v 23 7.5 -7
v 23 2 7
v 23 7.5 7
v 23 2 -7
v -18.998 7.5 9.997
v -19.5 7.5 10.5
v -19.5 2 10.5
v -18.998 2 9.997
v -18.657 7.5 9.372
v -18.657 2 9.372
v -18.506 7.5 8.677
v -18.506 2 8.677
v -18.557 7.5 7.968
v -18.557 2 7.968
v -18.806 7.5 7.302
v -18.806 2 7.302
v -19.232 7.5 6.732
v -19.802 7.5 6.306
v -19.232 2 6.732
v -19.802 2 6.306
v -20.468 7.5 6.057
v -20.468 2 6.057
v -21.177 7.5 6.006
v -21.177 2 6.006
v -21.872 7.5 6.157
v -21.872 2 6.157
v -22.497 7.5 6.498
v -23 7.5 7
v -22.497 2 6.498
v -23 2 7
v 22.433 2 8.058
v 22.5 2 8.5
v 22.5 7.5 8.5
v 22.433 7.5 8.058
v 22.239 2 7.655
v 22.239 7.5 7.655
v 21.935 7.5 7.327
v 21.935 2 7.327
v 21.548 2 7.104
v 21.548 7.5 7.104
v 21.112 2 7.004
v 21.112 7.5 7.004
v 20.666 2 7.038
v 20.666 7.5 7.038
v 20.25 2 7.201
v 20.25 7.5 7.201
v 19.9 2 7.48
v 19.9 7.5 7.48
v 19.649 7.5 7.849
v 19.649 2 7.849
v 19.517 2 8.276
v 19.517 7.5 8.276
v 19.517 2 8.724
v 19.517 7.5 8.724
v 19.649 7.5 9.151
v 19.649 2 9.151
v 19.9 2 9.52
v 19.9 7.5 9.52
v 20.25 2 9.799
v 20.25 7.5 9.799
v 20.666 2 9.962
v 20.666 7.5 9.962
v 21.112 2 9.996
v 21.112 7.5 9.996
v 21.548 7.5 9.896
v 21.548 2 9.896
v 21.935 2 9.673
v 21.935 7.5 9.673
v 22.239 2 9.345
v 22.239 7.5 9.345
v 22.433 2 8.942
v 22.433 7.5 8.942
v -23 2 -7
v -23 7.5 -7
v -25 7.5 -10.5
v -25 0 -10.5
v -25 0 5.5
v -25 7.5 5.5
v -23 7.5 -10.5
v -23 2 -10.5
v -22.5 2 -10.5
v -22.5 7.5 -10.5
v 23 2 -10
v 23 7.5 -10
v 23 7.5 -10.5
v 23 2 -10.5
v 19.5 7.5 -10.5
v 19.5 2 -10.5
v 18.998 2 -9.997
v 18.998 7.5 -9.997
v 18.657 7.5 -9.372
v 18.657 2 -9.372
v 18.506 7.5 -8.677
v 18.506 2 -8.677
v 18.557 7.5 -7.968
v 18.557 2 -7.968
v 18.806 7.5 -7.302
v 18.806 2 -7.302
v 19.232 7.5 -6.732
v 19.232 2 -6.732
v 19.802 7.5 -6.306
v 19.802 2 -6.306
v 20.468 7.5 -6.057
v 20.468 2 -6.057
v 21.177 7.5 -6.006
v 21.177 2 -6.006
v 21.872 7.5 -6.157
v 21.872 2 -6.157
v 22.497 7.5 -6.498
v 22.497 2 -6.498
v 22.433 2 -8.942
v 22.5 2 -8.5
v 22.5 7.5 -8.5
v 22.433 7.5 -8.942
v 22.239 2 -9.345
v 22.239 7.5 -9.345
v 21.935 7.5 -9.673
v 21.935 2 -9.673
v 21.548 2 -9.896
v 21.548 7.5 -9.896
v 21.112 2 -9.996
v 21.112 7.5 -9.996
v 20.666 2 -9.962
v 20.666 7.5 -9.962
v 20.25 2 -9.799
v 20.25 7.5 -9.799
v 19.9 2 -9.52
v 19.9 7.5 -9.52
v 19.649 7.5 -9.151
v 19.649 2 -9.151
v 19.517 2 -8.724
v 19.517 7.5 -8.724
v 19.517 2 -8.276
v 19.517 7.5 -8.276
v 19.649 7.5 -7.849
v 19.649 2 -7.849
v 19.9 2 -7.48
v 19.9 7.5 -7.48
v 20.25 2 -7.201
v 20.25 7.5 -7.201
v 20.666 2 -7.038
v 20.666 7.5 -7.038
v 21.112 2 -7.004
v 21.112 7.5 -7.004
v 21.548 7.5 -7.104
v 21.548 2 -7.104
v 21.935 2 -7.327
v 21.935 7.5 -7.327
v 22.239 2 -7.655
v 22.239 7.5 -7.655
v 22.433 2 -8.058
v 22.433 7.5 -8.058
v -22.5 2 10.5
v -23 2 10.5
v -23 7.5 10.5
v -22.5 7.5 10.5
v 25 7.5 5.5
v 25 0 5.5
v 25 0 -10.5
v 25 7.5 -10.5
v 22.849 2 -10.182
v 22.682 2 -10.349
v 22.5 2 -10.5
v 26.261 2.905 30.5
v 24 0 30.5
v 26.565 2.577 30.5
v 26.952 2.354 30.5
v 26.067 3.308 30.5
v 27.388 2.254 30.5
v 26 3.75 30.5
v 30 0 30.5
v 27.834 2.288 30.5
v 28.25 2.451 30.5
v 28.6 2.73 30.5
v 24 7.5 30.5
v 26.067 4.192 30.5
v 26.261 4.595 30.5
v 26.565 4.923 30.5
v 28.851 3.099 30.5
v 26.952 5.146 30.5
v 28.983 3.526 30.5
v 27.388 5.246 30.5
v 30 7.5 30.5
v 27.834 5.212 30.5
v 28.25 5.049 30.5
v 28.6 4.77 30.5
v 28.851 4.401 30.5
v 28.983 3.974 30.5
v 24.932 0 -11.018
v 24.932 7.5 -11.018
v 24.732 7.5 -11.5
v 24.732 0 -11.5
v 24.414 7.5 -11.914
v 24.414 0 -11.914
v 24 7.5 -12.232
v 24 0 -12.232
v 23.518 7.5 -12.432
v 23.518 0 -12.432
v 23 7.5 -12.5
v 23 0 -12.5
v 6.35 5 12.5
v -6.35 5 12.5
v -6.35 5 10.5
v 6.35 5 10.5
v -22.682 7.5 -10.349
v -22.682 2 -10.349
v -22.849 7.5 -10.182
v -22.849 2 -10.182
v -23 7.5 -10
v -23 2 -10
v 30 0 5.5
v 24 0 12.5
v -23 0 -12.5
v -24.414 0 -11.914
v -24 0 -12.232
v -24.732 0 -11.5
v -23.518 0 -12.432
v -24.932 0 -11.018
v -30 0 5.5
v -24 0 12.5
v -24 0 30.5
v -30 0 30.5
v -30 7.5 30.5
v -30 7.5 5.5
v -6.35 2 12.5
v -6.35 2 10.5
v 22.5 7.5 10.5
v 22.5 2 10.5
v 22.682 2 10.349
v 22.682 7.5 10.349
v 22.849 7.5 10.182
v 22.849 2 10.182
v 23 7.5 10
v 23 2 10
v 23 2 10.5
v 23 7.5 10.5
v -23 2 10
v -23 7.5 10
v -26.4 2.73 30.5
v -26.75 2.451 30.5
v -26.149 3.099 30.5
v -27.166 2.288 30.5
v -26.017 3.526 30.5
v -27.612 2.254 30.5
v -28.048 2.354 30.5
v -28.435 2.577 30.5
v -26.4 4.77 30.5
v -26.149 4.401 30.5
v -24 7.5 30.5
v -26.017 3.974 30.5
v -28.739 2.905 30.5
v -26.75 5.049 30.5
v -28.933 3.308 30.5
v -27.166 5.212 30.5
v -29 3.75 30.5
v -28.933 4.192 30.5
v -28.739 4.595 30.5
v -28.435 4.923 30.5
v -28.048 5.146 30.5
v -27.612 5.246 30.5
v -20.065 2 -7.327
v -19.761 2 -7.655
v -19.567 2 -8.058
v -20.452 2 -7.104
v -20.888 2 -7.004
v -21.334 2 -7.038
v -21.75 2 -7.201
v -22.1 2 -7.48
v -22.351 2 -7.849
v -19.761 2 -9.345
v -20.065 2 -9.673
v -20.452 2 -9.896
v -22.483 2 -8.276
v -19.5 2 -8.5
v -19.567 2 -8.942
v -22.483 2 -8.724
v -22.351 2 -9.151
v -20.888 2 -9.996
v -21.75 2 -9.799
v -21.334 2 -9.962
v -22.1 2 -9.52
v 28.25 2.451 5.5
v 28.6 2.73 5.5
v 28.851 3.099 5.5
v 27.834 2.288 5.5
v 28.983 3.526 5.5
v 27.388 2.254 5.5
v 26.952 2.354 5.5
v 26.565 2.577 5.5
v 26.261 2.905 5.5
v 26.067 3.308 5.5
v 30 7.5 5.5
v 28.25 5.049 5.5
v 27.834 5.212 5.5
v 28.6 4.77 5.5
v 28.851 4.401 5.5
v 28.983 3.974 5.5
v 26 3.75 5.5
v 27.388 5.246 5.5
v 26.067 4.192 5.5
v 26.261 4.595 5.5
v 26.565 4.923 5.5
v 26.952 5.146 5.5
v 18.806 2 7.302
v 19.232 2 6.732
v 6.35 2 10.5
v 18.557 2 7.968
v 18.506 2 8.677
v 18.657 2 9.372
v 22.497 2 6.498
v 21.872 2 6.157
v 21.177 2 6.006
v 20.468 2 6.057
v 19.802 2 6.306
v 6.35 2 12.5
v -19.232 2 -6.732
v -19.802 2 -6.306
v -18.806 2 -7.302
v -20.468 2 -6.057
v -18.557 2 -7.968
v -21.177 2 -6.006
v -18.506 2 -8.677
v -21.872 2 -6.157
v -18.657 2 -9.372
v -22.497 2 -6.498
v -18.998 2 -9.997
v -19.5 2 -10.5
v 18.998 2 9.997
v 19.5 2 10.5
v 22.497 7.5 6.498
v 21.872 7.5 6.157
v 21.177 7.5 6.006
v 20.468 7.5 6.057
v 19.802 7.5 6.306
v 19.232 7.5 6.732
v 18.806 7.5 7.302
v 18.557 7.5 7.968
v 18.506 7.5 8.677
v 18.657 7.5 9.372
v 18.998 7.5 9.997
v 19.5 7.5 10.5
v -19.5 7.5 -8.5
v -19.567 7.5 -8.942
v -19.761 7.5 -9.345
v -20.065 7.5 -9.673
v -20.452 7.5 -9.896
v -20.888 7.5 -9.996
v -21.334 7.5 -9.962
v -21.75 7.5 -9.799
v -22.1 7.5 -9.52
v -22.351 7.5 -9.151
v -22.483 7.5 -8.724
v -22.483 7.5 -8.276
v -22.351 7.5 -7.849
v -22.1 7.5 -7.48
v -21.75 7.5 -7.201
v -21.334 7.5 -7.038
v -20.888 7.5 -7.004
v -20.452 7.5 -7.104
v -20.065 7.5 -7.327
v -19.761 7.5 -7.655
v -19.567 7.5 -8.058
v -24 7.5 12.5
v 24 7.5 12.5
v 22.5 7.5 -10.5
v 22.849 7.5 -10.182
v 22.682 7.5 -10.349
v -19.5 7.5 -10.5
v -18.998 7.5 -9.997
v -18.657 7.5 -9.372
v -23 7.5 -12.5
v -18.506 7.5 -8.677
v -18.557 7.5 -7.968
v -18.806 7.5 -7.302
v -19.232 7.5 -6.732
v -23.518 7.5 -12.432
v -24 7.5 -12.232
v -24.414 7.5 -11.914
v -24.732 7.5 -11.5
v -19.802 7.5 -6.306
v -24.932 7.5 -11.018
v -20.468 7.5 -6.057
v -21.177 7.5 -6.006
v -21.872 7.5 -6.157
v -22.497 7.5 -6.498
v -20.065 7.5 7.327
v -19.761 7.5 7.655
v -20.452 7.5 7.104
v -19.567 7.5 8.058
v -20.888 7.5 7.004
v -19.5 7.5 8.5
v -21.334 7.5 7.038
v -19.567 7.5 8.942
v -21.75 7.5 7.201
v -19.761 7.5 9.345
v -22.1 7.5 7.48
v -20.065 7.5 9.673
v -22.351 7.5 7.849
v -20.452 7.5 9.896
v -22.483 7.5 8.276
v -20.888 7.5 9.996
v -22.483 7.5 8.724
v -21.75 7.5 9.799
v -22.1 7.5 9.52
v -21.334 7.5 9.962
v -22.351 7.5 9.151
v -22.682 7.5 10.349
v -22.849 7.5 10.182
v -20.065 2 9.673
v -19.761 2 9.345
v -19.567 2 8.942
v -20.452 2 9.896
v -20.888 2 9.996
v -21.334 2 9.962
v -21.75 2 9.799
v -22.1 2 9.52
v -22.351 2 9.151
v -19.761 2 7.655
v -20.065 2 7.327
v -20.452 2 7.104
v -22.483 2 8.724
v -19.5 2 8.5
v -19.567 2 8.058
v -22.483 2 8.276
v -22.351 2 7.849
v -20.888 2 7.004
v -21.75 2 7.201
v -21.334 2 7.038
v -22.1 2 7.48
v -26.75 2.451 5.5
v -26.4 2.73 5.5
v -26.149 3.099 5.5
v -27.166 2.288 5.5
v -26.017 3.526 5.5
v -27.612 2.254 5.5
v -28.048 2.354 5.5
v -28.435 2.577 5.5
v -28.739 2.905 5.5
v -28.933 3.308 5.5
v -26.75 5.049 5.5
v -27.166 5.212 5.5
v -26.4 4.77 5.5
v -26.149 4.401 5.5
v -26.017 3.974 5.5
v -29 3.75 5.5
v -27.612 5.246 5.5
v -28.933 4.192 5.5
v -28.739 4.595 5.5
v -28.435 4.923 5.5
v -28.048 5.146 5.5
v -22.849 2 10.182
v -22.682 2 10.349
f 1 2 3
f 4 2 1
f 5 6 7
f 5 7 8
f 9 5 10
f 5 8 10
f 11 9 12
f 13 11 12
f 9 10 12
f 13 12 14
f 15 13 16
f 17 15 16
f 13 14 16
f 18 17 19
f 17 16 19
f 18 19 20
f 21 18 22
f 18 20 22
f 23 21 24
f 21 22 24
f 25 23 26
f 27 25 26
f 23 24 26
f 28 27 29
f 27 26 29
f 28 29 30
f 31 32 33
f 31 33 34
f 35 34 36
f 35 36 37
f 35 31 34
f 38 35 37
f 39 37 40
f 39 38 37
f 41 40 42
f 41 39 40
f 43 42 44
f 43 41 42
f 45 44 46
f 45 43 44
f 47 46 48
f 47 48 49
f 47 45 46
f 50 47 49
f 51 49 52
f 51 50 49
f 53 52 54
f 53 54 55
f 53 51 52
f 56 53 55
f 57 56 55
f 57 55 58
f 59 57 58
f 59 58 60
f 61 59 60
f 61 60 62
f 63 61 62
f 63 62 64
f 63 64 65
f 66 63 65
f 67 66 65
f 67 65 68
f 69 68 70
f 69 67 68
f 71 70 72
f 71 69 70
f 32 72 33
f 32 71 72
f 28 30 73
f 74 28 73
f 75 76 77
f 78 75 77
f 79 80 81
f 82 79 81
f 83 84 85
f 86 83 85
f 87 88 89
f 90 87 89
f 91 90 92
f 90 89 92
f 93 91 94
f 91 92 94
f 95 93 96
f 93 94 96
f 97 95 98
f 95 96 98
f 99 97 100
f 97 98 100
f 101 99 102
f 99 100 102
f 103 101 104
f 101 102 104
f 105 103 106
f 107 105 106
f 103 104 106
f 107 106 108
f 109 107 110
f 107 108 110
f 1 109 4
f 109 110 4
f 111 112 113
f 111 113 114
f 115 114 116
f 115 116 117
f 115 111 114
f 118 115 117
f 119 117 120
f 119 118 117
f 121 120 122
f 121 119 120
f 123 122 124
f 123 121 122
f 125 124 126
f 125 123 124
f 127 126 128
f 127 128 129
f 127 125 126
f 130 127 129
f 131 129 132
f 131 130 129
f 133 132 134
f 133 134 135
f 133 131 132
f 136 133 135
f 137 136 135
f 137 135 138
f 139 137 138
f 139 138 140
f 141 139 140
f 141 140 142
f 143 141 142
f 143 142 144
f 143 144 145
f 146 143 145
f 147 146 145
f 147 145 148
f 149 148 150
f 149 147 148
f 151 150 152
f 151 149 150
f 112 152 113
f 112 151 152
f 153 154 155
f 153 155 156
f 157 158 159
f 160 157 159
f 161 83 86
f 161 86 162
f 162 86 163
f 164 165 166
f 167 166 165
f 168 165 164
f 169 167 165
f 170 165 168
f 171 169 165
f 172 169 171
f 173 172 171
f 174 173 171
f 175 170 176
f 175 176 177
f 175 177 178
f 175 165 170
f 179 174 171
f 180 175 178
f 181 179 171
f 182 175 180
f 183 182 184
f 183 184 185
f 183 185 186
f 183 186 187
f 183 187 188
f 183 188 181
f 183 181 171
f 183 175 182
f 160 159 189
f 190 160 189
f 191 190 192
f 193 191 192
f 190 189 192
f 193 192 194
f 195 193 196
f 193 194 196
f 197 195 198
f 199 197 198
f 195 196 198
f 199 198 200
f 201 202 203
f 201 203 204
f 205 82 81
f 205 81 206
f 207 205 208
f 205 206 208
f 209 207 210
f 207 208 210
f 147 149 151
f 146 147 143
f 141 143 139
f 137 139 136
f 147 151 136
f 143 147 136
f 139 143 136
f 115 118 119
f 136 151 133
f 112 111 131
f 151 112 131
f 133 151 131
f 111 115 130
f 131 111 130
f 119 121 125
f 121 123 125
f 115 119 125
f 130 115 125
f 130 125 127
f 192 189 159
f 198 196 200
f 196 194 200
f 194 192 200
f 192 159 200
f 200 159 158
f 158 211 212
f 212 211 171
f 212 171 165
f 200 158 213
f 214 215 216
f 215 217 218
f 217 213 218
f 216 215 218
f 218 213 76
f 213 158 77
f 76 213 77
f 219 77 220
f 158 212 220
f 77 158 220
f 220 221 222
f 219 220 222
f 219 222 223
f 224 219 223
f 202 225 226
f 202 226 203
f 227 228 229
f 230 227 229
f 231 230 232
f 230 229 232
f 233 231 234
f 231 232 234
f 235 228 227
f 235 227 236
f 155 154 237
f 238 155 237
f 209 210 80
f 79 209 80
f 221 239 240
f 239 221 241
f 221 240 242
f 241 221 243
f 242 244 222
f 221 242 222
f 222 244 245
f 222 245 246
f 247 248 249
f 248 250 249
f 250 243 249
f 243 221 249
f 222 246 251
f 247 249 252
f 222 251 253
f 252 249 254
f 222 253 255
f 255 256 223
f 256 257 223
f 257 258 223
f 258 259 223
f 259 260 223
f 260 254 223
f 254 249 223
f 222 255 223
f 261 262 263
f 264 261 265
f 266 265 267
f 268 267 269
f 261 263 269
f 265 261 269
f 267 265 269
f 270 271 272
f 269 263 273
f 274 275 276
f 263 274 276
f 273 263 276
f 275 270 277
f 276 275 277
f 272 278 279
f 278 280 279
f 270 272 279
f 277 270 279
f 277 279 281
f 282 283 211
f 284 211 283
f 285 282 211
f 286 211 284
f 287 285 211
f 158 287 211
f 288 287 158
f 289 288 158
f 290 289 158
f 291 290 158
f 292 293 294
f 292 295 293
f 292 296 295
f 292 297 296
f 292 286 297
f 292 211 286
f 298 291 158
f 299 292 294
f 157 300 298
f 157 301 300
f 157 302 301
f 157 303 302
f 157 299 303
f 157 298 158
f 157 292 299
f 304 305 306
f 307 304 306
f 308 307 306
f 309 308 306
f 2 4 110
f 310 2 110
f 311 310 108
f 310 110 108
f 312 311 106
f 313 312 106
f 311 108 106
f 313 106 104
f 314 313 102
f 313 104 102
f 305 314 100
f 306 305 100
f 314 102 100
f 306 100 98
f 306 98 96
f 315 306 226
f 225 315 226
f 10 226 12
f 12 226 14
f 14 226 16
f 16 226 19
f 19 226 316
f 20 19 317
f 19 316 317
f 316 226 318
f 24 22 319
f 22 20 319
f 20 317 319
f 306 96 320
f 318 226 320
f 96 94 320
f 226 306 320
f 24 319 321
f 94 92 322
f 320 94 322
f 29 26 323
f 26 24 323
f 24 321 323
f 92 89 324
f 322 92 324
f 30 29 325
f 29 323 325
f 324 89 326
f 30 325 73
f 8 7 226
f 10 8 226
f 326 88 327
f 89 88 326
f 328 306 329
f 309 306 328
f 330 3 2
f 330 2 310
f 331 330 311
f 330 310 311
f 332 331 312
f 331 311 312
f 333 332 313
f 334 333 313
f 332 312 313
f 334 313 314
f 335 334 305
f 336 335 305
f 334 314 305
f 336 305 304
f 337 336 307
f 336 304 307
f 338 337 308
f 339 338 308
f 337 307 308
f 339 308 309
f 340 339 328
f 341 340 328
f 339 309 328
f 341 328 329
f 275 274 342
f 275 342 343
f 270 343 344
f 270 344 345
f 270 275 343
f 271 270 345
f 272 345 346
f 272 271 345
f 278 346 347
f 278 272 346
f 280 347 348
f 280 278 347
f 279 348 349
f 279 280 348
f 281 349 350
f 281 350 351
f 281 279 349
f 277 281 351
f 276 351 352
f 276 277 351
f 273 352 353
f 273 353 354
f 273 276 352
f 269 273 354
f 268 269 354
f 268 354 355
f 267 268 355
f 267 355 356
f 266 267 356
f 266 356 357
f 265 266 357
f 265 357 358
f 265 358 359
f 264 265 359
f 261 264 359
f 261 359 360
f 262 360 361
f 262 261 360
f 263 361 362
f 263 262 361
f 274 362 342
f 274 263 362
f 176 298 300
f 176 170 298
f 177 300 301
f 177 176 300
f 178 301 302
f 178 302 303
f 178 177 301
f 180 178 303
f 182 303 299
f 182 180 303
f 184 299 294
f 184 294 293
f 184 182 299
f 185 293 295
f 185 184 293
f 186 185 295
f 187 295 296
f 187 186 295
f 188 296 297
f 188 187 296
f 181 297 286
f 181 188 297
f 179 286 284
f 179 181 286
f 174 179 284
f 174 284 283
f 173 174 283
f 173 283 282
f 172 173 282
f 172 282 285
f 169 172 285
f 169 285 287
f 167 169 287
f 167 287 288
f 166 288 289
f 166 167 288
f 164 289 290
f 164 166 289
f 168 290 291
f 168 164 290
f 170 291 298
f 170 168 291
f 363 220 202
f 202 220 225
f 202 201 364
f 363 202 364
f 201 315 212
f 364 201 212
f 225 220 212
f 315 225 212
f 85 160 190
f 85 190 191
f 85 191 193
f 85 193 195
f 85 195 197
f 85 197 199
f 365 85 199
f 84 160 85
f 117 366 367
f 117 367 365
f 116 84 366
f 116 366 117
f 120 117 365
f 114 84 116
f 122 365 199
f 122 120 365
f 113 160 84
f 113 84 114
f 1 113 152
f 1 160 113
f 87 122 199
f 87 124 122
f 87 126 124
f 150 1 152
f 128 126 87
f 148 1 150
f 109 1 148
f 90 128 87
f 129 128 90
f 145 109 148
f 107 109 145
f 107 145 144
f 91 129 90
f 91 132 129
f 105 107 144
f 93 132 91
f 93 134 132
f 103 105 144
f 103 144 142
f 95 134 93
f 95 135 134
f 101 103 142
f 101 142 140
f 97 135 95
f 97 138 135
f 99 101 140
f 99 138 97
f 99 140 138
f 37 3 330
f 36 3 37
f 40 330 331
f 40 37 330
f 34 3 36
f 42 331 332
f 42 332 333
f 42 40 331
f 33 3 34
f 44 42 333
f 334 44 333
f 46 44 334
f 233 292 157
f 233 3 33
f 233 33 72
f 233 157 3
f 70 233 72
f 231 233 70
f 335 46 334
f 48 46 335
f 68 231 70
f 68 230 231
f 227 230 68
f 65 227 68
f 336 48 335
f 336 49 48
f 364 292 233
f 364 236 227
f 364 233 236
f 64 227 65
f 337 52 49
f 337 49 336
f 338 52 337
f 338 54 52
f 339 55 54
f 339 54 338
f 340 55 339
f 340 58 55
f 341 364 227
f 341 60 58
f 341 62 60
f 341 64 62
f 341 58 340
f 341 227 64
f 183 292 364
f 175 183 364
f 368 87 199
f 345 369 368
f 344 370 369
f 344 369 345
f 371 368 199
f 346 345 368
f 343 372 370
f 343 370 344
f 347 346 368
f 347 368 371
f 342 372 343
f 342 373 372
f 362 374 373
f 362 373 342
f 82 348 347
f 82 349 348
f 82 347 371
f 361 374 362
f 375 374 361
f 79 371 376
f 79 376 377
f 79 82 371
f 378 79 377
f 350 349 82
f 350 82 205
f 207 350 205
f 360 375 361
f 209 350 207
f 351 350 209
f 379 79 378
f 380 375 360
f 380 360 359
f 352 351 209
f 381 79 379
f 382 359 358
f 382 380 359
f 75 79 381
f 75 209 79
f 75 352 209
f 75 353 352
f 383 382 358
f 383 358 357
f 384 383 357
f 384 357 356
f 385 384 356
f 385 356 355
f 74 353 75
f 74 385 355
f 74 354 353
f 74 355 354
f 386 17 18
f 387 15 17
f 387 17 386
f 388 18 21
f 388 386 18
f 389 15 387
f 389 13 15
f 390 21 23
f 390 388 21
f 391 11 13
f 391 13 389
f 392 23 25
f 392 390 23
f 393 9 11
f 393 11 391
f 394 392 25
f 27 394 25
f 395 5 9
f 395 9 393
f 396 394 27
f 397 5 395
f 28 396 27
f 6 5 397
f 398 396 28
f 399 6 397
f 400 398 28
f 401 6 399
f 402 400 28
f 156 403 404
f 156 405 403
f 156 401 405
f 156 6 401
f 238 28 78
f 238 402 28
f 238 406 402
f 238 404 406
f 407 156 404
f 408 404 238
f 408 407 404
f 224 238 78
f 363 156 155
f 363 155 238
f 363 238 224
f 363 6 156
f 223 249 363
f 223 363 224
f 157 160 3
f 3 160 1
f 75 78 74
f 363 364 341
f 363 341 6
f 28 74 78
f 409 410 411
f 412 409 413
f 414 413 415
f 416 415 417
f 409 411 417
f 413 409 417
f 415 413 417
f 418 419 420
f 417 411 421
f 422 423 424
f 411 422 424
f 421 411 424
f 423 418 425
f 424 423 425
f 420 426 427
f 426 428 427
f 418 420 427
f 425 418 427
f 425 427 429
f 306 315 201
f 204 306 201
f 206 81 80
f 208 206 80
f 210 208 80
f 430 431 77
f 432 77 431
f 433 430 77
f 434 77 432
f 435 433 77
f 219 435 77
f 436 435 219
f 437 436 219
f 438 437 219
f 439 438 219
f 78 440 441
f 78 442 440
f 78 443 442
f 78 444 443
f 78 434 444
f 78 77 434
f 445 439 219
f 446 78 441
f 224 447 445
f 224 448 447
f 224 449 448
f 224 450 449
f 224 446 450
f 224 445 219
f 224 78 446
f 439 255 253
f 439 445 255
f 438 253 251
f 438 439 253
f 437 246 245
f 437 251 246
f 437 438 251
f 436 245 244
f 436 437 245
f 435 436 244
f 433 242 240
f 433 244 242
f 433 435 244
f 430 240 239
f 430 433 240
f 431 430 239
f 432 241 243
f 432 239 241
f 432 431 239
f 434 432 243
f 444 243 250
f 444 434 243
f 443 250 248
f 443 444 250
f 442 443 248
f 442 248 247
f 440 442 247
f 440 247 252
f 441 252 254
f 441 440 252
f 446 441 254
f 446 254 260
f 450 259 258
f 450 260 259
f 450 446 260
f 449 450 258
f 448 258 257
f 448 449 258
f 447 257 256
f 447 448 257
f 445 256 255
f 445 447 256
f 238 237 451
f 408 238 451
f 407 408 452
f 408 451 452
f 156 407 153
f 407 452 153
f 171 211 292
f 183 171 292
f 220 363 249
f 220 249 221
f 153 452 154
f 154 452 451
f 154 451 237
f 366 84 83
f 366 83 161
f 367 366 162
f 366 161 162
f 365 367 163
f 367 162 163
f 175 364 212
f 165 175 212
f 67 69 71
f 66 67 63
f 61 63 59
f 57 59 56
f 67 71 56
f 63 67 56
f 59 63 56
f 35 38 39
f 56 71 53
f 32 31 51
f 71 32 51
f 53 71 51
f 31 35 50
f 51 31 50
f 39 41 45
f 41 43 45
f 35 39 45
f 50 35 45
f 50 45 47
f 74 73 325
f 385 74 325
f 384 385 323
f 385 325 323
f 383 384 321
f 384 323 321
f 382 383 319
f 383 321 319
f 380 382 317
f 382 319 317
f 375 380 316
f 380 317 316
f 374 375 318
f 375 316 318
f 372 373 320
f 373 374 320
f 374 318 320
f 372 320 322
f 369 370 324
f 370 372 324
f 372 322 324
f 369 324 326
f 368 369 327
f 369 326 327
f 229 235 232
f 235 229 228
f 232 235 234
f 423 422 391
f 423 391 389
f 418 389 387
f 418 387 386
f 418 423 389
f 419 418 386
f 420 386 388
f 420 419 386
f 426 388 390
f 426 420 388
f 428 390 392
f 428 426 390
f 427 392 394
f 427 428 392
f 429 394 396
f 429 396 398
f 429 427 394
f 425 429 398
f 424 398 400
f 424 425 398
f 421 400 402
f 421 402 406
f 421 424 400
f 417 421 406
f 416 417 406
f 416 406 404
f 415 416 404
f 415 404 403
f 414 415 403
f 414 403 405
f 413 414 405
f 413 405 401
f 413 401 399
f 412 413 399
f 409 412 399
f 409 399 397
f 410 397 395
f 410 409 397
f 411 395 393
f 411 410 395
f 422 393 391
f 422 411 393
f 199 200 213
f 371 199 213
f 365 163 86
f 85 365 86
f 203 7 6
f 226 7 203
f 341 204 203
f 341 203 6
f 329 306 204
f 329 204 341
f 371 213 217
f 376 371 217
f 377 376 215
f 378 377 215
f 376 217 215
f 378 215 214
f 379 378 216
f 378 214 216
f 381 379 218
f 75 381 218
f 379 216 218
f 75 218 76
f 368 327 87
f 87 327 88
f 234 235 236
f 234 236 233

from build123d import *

# Parameters (mm, degrees)
EXTRUDE_1_DEPTH     = 2
SKETCH_2_W          = 46
SKETCH_2_H          = 21
EXTRUDE_2_DEPTH     = 5.5
SKETCH_3_R          = 2.5
SKETCH_3_R_2        = 1.5
EXTRUDE_3_DEPTH     = 5.5
CUT_EXTRUDE_2_REACH = 27
SKETCH_5_W          = 12.7
SKETCH_5_H          = 3
EXTRUDE_4_DEPTH     = 7.5
SKETCH_7_R          = 1.5
CUT_EXTRUDE_3_DEPTH = 3
EXTRUDE_5_DEPTH     = 18
EXTRUDE_6_DEPTH     = 18
SKETCH_10_W         = 5
SKETCH_10_H         = 7.5
SKETCH_10_R         = 1.5
EXTRUDE_7_DEPTH     = 5


with BuildPart() as part:
    # 草图1 → 凸台-拉伸1 (new body)
    with BuildSketch(Plane(origin=(0, 0, 0), x_dir=(1, 0, 0), z_dir=(0, 1, 0))):
        with BuildLine():
            Line((-23, 12.5), (23, 12.5))
            ThreePointArc((23, 12.5), (24.414213562, 11.914213562), (25, 10.5))
            Line((25, 10.5), (25, -10.5))
            ThreePointArc((25, -10.5), (24.414213562, -11.914213562), (23, -12.5))
            Line((23, -12.5), (-23, -12.5))
            ThreePointArc((-23, -12.5), (-24.414213562, -11.914213562), (-25, -10.5))
            Line((-25, -10.5), (-25, 10.5))
            ThreePointArc((-25, 10.5), (-24.414213562, 11.914213562), (-23, 12.5))
        make_face()
    extrude(amount=EXTRUDE_1_DEPTH)

    # 草图2 → 凸台-拉伸2 (add)
    with BuildSketch(Plane(origin=(0, 2, 0), x_dir=(1, 0, 0), z_dir=(0, 1, 0))):
        with BuildLine():
            Line((-25, 10.5), (-25, -10.5))
            ThreePointArc((-25, -10.5), (-24.414213562, -11.914213562), (-23, -12.5))
            Line((-23, -12.5), (23, -12.5))
            ThreePointArc((23, -12.5), (24.414213562, -11.914213562), (25, -10.5))
            Line((25, -10.5), (25, 10.5))
            ThreePointArc((25, 10.5), (24.414213562, 11.914213562), (23, 12.5))
            Line((23, 12.5), (-23, 12.5))
            ThreePointArc((-23, 12.5), (-24.414213562, 11.914213562), (-25, 10.5))
        make_face()
        Rectangle(SKETCH_2_W, SKETCH_2_H, mode=Mode.SUBTRACT)
    extrude(amount=EXTRUDE_2_DEPTH)

    # 草图3 → 凸台-拉伸3 (add)
    with BuildSketch(Plane(origin=(0, 2, 0), x_dir=(1, 0, 0), z_dir=(0, 1, 0))):
        with Locations((-21, 8.5)):
            Circle(SKETCH_3_R)
        with Locations((-21, 8.5)):
            Circle(SKETCH_3_R_2, mode=Mode.SUBTRACT)
        with Locations((21, 8.5)):
            Circle(SKETCH_3_R)
        with Locations((21, 8.5)):
            Circle(SKETCH_3_R_2, mode=Mode.SUBTRACT)
        with Locations((21, -8.5)):
            Circle(SKETCH_3_R)
        with Locations((21, -8.5)):
            Circle(SKETCH_3_R_2, mode=Mode.SUBTRACT)
        with Locations((-21, -8.5)):
            Circle(SKETCH_3_R)
        with Locations((-21, -8.5)):
            Circle(SKETCH_3_R_2, mode=Mode.SUBTRACT)
    extrude(amount=EXTRUDE_3_DEPTH)

    # 草图5 → 切除-拉伸2 (cut, up to next)
    with BuildSketch(Plane.XY.offset(12.5), mode=Mode.PRIVATE) as cut_extrude_2_sk1:
        with Locations((0, 3.5)):
            Rectangle(SKETCH_5_W, SKETCH_5_H)
    cut_extrude_2_tool1 = extrude(cut_extrude_2_sk1.sketch, amount=-CUT_EXTRUDE_2_REACH, mode=Mode.PRIVATE) & part.part
    add(cut_extrude_2_tool1.solids().sort_by_distance((0, 3.5, 12.5))[0], mode=Mode.SUBTRACT)

    # 草图6 → 凸台-拉伸4 (add)
    with BuildSketch(Plane.XZ):
        Polygon((23, 12.5), (30, 12.5), (30, 10.5), (25, 10.5), align=None)
        Polygon((-23, 12.5), (-30, 12.5), (-30, 10.5), (-25, 10.5), align=None)
    extrude(amount=-EXTRUDE_4_DEPTH)

    # 草图7 → 切除-拉伸3 (cut, through all)
    with BuildSketch(Plane(origin=(0, 0, 10.5), x_dir=(-1, 0, 0), z_dir=(0, 0, -1))):
        with Locations((-27.5, 3.75)):
            Circle(SKETCH_7_R)
        with Locations((27.5, 3.75)):
            Circle(SKETCH_7_R)
    extrude(amount=-CUT_EXTRUDE_3_DEPTH, mode=Mode.SUBTRACT)

    # 草图8 → 凸台-拉伸5 (add)
    with BuildSketch(Plane.XY.offset(12.5)):
        with BuildLine():
            Line((-29, 7.5), (-29, 3.75))
            ThreePointArc((-29, 3.75), (-27.5, 2.25), (-26, 3.75))
            Line((-26, 3.75), (-26, 7.5))
            Line((-26, 7.5), (-24, 7.5))
            Line((-24, 7.5), (-24, 0))
            Line((-24, 0), (-30, 0))
            Line((-30, 0), (-30, 7.5))
            Line((-30, 7.5), (-29, 7.5))
        make_face()
        with BuildLine():
            Line((29, 7.5), (29, 3.75))
            ThreePointArc((29, 3.75), (27.5, 2.25), (26, 3.75))
            Line((26, 3.75), (26, 7.5))
            Line((26, 7.5), (24, 7.5))
            Line((24, 7.5), (24, 0))
            Line((24, 0), (30, 0))
            Line((30, 0), (30, 7.5))
            Line((30, 7.5), (29, 7.5))
        make_face()
    extrude(amount=EXTRUDE_5_DEPTH)

    # 草图9 → 凸台-拉伸6 (add)
    with BuildSketch(Plane.XY.offset(12.5)):
        with BuildLine():
            Line((29, 3.75), (29, 7.5))
            Line((29, 7.5), (26, 7.5))
            Line((26, 7.5), (26, 3.75))
            ThreePointArc((26, 3.75), (27.5, 5.25), (29, 3.75))
        make_face()
        with BuildLine():
            Line((-29, 7.5), (-29, 3.75))
            ThreePointArc((-29, 3.75), (-27.5, 5.25), (-26, 3.75))
            Line((-26, 3.75), (-26, 7.5))
            Line((-26, 7.5), (-29, 7.5))
        make_face()
    extrude(amount=EXTRUDE_6_DEPTH)

    # 草图10 → 凸台-拉伸7 (add)
    with BuildSketch(Plane(origin=(0, 0, 10.5), x_dir=(-1, 0, 0), z_dir=(0, 0, -1))):
        with Locations((-27.5, 3.75)):
            Rectangle(SKETCH_10_W, SKETCH_10_H)
        with Locations((-27.5, 3.75)):
            Circle(SKETCH_10_R, mode=Mode.SUBTRACT)
        with Locations((27.5, 3.75)):
            Rectangle(SKETCH_10_W, SKETCH_10_H)
        with Locations((27.5, 3.75)):
            Circle(SKETCH_10_R, mode=Mode.SUBTRACT)
    extrude(amount=EXTRUDE_7_DEPTH)


solid = part.part
